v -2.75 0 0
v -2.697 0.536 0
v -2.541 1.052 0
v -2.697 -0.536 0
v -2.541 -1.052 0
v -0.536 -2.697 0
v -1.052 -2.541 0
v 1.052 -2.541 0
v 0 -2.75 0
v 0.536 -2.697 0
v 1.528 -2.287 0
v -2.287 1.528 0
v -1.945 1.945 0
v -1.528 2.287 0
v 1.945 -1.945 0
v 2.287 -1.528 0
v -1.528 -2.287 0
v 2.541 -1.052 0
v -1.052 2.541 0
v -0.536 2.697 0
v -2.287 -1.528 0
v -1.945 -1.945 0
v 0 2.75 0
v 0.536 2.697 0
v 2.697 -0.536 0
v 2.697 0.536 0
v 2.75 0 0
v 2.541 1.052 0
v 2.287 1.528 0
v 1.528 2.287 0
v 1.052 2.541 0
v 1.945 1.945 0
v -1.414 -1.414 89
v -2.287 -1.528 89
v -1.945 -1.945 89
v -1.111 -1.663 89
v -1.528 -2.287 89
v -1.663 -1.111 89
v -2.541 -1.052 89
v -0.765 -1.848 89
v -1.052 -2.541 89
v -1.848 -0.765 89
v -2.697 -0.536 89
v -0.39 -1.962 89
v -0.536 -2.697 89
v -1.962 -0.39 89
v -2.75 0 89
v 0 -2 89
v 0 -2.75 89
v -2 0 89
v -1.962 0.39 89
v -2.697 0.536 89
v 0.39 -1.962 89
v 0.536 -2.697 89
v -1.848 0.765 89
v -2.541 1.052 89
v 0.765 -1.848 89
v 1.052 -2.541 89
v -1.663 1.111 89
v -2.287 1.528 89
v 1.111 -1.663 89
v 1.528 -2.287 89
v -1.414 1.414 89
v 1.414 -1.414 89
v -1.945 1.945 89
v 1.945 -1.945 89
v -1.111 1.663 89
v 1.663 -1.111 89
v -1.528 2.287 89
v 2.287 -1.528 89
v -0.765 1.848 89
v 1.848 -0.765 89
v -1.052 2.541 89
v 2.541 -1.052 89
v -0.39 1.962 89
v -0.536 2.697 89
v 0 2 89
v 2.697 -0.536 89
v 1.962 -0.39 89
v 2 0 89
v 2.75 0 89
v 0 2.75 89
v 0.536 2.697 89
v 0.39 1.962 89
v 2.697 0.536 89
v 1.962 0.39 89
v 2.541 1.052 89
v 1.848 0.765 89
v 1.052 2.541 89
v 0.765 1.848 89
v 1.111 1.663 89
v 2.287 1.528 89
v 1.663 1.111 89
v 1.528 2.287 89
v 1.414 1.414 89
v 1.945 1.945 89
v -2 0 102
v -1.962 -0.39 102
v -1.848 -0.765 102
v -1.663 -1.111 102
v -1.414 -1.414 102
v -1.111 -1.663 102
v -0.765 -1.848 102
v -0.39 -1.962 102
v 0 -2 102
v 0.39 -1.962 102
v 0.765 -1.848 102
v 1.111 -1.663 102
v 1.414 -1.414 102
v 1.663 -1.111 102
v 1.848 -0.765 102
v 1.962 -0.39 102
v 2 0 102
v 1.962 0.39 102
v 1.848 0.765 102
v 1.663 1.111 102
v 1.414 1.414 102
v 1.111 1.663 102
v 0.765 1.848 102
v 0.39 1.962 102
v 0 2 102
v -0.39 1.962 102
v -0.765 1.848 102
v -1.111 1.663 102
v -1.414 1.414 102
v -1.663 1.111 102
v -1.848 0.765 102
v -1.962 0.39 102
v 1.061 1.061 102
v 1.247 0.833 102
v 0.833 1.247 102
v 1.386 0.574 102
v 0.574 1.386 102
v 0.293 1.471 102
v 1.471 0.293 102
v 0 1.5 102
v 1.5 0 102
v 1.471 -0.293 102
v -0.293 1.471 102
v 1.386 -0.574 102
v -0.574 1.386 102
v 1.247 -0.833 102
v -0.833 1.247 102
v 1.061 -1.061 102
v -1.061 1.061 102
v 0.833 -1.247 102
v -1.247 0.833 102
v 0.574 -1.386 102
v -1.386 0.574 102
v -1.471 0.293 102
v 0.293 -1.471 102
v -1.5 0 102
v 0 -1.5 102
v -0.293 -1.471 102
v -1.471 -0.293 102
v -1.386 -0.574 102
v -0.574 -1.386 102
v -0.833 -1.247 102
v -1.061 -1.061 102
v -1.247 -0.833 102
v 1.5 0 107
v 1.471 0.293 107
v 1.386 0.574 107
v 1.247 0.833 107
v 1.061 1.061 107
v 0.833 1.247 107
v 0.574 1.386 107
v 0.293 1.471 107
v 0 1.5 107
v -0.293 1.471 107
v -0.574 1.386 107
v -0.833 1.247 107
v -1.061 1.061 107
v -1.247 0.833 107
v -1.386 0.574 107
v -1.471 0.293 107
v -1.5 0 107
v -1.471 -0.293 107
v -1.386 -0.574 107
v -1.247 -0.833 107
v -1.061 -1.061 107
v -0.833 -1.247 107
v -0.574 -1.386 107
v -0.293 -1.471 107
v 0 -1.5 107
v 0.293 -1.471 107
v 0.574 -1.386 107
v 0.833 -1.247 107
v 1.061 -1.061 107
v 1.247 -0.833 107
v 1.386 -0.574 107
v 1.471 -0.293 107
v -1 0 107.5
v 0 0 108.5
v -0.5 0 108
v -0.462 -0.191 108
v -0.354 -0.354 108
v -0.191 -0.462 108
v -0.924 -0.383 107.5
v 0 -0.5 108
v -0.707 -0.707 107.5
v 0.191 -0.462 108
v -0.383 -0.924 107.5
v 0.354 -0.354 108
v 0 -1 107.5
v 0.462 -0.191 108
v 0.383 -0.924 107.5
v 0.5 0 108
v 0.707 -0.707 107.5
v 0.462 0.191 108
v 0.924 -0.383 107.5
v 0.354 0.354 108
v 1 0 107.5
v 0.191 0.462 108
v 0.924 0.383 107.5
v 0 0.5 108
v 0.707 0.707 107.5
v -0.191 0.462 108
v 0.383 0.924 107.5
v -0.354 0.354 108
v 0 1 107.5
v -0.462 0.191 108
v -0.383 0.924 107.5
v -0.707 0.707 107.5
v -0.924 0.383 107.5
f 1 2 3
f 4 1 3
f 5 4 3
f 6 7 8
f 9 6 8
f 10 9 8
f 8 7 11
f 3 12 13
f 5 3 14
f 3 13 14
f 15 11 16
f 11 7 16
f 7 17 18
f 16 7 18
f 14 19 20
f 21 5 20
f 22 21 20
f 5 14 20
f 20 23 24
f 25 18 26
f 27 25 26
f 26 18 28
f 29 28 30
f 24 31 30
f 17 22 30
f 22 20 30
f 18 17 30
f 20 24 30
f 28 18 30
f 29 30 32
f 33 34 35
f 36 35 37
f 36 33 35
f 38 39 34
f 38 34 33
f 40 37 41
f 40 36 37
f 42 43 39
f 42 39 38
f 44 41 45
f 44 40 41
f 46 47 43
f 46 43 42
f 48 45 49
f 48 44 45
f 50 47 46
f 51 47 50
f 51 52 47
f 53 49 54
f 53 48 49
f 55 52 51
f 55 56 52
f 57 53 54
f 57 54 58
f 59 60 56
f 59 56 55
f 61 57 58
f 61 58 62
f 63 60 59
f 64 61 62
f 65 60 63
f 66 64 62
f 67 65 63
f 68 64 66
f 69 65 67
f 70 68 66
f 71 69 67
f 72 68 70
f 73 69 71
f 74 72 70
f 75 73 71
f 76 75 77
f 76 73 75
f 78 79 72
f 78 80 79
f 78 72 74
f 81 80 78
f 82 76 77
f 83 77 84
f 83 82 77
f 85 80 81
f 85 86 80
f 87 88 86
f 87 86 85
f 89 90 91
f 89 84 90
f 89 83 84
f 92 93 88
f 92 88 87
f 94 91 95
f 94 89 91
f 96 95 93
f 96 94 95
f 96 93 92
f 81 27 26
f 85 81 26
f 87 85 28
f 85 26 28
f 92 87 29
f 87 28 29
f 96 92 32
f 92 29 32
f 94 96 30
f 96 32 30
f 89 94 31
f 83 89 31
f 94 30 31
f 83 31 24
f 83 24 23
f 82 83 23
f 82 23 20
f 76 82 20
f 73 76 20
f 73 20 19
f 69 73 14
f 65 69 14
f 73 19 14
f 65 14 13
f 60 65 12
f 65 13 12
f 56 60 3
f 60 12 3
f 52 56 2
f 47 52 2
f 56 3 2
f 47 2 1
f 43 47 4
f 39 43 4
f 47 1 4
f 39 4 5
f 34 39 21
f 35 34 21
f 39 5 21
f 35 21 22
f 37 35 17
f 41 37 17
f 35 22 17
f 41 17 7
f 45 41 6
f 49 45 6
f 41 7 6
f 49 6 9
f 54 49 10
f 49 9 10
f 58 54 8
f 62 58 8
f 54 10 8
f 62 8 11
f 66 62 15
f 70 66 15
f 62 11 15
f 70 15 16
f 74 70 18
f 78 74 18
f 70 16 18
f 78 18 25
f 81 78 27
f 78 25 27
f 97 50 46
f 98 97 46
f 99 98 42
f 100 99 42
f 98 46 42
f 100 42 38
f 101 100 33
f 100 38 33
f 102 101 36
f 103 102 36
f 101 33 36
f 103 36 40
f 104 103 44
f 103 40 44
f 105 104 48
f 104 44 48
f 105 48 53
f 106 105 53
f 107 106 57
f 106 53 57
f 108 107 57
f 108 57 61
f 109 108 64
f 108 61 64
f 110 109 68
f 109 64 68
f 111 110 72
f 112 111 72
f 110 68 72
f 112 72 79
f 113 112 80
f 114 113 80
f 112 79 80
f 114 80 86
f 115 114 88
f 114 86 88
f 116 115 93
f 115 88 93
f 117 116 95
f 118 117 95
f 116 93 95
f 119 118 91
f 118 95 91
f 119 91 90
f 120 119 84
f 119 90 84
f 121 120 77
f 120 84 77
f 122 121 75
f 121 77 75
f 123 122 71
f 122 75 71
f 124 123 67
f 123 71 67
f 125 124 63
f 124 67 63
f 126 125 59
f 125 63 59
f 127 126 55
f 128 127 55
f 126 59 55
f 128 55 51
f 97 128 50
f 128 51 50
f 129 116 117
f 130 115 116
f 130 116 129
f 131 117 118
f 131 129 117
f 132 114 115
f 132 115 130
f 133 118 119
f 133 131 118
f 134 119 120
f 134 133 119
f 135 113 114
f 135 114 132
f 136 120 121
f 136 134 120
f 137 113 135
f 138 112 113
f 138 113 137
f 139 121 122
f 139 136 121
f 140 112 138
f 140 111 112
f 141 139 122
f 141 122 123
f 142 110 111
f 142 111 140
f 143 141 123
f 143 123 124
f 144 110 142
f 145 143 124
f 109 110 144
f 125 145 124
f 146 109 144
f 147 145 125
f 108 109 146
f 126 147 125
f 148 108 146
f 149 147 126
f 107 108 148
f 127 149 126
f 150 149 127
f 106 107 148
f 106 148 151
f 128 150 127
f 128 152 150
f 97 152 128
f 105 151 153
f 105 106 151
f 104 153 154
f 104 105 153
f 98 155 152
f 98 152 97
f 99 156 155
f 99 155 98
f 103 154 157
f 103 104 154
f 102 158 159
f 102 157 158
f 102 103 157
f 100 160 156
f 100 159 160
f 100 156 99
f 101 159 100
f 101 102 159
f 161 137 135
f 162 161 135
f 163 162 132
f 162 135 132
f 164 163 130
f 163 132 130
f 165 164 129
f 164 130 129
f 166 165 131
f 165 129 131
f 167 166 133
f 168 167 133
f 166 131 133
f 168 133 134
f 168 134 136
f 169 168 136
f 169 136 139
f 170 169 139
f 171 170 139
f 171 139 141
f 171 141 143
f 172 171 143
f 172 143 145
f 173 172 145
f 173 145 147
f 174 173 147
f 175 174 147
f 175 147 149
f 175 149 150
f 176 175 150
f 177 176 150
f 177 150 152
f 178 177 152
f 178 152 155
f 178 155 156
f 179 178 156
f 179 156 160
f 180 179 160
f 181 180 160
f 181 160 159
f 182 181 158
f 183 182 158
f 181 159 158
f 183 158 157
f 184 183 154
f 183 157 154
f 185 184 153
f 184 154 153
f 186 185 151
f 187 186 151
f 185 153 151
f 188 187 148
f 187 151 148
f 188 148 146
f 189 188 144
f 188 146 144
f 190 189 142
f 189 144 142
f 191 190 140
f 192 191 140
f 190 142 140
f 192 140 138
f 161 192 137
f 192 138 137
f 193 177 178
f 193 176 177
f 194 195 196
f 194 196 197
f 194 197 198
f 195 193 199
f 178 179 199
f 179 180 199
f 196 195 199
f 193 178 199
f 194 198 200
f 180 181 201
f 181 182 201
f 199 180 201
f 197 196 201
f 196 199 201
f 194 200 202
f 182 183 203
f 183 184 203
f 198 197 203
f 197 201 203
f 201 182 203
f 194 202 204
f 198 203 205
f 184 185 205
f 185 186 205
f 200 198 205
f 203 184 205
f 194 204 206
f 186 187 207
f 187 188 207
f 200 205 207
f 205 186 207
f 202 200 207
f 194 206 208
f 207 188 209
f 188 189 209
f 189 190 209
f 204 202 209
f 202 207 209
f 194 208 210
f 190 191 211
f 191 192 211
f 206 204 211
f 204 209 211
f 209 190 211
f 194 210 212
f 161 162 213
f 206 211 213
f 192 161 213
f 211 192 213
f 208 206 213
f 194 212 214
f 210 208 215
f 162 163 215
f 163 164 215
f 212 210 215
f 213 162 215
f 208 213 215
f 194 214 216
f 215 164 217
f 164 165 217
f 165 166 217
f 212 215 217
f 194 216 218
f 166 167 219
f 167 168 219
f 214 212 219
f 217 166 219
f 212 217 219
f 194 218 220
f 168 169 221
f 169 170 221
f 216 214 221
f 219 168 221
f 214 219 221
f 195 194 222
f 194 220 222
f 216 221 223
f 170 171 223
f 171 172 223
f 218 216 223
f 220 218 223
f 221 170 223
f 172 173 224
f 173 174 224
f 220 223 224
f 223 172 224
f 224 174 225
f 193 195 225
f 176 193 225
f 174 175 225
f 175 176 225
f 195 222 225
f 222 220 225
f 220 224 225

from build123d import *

# Parameters (mm, degrees)
SKETCH_1_R      = 2.75
EXTRUDE_1_DEPTH = 89
SKETCH_2_R      = 2
EXTRUDE_2_DEPTH = 13
SKETCH_3_R      = 1.5
EXTRUDE_3_DEPTH = 5


with BuildPart() as part:
    # 草图1 → 凸台-拉伸1 (new body)
    with BuildSketch(Plane.XY):
        Circle(SKETCH_1_R)
    extrude(amount=EXTRUDE_1_DEPTH)

    # 草图2 → 凸台-拉伸2 (add)
    with BuildSketch(Plane.XY.offset(89)):
        with Locations(Location((0, 0, 0), (0, 0, 180))):
            Circle(SKETCH_2_R)
    extrude(amount=EXTRUDE_2_DEPTH)

    # 草图3 → 凸台-拉伸3 (add)
    with BuildSketch(Plane.XY.offset(102)):
        Circle(SKETCH_3_R)
    extrude(amount=EXTRUDE_3_DEPTH)

    # 草图4 → 旋转1 (revolve)
    with BuildSketch(Plane(origin=(0, 0, 0), x_dir=(1, 0, 0), z_dir=(0, 1, 0))):
        Polygon((0, -107), (0, -108.500036411), (-1.5, -107), align=None)
    revolve(axis=Axis((0, 0, 107), (0, 0, 1)))


solid = part.part
